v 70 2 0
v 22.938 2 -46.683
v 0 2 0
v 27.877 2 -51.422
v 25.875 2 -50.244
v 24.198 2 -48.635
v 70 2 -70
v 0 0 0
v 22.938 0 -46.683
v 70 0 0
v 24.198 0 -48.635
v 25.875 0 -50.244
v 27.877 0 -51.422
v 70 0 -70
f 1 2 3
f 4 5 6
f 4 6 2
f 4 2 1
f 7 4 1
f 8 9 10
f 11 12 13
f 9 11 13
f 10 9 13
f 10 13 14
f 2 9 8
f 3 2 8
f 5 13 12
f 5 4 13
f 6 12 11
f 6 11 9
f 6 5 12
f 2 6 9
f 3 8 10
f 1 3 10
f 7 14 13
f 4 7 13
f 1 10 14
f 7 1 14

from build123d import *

# Parameters (mm, degrees)
RESSALTO_EXTRUS_O1_DEPTH = 2
FILETE1_R                = 10


with BuildPart() as part:
    # Esboço1 → Ressalto-extrusão1 (new body)
    with BuildSketch(Plane(origin=(0, 0, 0), x_dir=(1, 0, 0), z_dir=(0, 1, 0))):
        Polygon((0, 0), (70, 0), (70, 70), (24.544299076, 49.952139866), align=None)
    extrude(amount=RESSALTO_EXTRUS_O1_DEPTH)

    # Filete1
    filete1_edges = [part.edges().sort_by_distance(p)[0] for p in [
        (24.544299076, 1, -49.952139866),
    ]]
    fillet(filete1_edges, radius=FILETE1_R)


solid = part.part
